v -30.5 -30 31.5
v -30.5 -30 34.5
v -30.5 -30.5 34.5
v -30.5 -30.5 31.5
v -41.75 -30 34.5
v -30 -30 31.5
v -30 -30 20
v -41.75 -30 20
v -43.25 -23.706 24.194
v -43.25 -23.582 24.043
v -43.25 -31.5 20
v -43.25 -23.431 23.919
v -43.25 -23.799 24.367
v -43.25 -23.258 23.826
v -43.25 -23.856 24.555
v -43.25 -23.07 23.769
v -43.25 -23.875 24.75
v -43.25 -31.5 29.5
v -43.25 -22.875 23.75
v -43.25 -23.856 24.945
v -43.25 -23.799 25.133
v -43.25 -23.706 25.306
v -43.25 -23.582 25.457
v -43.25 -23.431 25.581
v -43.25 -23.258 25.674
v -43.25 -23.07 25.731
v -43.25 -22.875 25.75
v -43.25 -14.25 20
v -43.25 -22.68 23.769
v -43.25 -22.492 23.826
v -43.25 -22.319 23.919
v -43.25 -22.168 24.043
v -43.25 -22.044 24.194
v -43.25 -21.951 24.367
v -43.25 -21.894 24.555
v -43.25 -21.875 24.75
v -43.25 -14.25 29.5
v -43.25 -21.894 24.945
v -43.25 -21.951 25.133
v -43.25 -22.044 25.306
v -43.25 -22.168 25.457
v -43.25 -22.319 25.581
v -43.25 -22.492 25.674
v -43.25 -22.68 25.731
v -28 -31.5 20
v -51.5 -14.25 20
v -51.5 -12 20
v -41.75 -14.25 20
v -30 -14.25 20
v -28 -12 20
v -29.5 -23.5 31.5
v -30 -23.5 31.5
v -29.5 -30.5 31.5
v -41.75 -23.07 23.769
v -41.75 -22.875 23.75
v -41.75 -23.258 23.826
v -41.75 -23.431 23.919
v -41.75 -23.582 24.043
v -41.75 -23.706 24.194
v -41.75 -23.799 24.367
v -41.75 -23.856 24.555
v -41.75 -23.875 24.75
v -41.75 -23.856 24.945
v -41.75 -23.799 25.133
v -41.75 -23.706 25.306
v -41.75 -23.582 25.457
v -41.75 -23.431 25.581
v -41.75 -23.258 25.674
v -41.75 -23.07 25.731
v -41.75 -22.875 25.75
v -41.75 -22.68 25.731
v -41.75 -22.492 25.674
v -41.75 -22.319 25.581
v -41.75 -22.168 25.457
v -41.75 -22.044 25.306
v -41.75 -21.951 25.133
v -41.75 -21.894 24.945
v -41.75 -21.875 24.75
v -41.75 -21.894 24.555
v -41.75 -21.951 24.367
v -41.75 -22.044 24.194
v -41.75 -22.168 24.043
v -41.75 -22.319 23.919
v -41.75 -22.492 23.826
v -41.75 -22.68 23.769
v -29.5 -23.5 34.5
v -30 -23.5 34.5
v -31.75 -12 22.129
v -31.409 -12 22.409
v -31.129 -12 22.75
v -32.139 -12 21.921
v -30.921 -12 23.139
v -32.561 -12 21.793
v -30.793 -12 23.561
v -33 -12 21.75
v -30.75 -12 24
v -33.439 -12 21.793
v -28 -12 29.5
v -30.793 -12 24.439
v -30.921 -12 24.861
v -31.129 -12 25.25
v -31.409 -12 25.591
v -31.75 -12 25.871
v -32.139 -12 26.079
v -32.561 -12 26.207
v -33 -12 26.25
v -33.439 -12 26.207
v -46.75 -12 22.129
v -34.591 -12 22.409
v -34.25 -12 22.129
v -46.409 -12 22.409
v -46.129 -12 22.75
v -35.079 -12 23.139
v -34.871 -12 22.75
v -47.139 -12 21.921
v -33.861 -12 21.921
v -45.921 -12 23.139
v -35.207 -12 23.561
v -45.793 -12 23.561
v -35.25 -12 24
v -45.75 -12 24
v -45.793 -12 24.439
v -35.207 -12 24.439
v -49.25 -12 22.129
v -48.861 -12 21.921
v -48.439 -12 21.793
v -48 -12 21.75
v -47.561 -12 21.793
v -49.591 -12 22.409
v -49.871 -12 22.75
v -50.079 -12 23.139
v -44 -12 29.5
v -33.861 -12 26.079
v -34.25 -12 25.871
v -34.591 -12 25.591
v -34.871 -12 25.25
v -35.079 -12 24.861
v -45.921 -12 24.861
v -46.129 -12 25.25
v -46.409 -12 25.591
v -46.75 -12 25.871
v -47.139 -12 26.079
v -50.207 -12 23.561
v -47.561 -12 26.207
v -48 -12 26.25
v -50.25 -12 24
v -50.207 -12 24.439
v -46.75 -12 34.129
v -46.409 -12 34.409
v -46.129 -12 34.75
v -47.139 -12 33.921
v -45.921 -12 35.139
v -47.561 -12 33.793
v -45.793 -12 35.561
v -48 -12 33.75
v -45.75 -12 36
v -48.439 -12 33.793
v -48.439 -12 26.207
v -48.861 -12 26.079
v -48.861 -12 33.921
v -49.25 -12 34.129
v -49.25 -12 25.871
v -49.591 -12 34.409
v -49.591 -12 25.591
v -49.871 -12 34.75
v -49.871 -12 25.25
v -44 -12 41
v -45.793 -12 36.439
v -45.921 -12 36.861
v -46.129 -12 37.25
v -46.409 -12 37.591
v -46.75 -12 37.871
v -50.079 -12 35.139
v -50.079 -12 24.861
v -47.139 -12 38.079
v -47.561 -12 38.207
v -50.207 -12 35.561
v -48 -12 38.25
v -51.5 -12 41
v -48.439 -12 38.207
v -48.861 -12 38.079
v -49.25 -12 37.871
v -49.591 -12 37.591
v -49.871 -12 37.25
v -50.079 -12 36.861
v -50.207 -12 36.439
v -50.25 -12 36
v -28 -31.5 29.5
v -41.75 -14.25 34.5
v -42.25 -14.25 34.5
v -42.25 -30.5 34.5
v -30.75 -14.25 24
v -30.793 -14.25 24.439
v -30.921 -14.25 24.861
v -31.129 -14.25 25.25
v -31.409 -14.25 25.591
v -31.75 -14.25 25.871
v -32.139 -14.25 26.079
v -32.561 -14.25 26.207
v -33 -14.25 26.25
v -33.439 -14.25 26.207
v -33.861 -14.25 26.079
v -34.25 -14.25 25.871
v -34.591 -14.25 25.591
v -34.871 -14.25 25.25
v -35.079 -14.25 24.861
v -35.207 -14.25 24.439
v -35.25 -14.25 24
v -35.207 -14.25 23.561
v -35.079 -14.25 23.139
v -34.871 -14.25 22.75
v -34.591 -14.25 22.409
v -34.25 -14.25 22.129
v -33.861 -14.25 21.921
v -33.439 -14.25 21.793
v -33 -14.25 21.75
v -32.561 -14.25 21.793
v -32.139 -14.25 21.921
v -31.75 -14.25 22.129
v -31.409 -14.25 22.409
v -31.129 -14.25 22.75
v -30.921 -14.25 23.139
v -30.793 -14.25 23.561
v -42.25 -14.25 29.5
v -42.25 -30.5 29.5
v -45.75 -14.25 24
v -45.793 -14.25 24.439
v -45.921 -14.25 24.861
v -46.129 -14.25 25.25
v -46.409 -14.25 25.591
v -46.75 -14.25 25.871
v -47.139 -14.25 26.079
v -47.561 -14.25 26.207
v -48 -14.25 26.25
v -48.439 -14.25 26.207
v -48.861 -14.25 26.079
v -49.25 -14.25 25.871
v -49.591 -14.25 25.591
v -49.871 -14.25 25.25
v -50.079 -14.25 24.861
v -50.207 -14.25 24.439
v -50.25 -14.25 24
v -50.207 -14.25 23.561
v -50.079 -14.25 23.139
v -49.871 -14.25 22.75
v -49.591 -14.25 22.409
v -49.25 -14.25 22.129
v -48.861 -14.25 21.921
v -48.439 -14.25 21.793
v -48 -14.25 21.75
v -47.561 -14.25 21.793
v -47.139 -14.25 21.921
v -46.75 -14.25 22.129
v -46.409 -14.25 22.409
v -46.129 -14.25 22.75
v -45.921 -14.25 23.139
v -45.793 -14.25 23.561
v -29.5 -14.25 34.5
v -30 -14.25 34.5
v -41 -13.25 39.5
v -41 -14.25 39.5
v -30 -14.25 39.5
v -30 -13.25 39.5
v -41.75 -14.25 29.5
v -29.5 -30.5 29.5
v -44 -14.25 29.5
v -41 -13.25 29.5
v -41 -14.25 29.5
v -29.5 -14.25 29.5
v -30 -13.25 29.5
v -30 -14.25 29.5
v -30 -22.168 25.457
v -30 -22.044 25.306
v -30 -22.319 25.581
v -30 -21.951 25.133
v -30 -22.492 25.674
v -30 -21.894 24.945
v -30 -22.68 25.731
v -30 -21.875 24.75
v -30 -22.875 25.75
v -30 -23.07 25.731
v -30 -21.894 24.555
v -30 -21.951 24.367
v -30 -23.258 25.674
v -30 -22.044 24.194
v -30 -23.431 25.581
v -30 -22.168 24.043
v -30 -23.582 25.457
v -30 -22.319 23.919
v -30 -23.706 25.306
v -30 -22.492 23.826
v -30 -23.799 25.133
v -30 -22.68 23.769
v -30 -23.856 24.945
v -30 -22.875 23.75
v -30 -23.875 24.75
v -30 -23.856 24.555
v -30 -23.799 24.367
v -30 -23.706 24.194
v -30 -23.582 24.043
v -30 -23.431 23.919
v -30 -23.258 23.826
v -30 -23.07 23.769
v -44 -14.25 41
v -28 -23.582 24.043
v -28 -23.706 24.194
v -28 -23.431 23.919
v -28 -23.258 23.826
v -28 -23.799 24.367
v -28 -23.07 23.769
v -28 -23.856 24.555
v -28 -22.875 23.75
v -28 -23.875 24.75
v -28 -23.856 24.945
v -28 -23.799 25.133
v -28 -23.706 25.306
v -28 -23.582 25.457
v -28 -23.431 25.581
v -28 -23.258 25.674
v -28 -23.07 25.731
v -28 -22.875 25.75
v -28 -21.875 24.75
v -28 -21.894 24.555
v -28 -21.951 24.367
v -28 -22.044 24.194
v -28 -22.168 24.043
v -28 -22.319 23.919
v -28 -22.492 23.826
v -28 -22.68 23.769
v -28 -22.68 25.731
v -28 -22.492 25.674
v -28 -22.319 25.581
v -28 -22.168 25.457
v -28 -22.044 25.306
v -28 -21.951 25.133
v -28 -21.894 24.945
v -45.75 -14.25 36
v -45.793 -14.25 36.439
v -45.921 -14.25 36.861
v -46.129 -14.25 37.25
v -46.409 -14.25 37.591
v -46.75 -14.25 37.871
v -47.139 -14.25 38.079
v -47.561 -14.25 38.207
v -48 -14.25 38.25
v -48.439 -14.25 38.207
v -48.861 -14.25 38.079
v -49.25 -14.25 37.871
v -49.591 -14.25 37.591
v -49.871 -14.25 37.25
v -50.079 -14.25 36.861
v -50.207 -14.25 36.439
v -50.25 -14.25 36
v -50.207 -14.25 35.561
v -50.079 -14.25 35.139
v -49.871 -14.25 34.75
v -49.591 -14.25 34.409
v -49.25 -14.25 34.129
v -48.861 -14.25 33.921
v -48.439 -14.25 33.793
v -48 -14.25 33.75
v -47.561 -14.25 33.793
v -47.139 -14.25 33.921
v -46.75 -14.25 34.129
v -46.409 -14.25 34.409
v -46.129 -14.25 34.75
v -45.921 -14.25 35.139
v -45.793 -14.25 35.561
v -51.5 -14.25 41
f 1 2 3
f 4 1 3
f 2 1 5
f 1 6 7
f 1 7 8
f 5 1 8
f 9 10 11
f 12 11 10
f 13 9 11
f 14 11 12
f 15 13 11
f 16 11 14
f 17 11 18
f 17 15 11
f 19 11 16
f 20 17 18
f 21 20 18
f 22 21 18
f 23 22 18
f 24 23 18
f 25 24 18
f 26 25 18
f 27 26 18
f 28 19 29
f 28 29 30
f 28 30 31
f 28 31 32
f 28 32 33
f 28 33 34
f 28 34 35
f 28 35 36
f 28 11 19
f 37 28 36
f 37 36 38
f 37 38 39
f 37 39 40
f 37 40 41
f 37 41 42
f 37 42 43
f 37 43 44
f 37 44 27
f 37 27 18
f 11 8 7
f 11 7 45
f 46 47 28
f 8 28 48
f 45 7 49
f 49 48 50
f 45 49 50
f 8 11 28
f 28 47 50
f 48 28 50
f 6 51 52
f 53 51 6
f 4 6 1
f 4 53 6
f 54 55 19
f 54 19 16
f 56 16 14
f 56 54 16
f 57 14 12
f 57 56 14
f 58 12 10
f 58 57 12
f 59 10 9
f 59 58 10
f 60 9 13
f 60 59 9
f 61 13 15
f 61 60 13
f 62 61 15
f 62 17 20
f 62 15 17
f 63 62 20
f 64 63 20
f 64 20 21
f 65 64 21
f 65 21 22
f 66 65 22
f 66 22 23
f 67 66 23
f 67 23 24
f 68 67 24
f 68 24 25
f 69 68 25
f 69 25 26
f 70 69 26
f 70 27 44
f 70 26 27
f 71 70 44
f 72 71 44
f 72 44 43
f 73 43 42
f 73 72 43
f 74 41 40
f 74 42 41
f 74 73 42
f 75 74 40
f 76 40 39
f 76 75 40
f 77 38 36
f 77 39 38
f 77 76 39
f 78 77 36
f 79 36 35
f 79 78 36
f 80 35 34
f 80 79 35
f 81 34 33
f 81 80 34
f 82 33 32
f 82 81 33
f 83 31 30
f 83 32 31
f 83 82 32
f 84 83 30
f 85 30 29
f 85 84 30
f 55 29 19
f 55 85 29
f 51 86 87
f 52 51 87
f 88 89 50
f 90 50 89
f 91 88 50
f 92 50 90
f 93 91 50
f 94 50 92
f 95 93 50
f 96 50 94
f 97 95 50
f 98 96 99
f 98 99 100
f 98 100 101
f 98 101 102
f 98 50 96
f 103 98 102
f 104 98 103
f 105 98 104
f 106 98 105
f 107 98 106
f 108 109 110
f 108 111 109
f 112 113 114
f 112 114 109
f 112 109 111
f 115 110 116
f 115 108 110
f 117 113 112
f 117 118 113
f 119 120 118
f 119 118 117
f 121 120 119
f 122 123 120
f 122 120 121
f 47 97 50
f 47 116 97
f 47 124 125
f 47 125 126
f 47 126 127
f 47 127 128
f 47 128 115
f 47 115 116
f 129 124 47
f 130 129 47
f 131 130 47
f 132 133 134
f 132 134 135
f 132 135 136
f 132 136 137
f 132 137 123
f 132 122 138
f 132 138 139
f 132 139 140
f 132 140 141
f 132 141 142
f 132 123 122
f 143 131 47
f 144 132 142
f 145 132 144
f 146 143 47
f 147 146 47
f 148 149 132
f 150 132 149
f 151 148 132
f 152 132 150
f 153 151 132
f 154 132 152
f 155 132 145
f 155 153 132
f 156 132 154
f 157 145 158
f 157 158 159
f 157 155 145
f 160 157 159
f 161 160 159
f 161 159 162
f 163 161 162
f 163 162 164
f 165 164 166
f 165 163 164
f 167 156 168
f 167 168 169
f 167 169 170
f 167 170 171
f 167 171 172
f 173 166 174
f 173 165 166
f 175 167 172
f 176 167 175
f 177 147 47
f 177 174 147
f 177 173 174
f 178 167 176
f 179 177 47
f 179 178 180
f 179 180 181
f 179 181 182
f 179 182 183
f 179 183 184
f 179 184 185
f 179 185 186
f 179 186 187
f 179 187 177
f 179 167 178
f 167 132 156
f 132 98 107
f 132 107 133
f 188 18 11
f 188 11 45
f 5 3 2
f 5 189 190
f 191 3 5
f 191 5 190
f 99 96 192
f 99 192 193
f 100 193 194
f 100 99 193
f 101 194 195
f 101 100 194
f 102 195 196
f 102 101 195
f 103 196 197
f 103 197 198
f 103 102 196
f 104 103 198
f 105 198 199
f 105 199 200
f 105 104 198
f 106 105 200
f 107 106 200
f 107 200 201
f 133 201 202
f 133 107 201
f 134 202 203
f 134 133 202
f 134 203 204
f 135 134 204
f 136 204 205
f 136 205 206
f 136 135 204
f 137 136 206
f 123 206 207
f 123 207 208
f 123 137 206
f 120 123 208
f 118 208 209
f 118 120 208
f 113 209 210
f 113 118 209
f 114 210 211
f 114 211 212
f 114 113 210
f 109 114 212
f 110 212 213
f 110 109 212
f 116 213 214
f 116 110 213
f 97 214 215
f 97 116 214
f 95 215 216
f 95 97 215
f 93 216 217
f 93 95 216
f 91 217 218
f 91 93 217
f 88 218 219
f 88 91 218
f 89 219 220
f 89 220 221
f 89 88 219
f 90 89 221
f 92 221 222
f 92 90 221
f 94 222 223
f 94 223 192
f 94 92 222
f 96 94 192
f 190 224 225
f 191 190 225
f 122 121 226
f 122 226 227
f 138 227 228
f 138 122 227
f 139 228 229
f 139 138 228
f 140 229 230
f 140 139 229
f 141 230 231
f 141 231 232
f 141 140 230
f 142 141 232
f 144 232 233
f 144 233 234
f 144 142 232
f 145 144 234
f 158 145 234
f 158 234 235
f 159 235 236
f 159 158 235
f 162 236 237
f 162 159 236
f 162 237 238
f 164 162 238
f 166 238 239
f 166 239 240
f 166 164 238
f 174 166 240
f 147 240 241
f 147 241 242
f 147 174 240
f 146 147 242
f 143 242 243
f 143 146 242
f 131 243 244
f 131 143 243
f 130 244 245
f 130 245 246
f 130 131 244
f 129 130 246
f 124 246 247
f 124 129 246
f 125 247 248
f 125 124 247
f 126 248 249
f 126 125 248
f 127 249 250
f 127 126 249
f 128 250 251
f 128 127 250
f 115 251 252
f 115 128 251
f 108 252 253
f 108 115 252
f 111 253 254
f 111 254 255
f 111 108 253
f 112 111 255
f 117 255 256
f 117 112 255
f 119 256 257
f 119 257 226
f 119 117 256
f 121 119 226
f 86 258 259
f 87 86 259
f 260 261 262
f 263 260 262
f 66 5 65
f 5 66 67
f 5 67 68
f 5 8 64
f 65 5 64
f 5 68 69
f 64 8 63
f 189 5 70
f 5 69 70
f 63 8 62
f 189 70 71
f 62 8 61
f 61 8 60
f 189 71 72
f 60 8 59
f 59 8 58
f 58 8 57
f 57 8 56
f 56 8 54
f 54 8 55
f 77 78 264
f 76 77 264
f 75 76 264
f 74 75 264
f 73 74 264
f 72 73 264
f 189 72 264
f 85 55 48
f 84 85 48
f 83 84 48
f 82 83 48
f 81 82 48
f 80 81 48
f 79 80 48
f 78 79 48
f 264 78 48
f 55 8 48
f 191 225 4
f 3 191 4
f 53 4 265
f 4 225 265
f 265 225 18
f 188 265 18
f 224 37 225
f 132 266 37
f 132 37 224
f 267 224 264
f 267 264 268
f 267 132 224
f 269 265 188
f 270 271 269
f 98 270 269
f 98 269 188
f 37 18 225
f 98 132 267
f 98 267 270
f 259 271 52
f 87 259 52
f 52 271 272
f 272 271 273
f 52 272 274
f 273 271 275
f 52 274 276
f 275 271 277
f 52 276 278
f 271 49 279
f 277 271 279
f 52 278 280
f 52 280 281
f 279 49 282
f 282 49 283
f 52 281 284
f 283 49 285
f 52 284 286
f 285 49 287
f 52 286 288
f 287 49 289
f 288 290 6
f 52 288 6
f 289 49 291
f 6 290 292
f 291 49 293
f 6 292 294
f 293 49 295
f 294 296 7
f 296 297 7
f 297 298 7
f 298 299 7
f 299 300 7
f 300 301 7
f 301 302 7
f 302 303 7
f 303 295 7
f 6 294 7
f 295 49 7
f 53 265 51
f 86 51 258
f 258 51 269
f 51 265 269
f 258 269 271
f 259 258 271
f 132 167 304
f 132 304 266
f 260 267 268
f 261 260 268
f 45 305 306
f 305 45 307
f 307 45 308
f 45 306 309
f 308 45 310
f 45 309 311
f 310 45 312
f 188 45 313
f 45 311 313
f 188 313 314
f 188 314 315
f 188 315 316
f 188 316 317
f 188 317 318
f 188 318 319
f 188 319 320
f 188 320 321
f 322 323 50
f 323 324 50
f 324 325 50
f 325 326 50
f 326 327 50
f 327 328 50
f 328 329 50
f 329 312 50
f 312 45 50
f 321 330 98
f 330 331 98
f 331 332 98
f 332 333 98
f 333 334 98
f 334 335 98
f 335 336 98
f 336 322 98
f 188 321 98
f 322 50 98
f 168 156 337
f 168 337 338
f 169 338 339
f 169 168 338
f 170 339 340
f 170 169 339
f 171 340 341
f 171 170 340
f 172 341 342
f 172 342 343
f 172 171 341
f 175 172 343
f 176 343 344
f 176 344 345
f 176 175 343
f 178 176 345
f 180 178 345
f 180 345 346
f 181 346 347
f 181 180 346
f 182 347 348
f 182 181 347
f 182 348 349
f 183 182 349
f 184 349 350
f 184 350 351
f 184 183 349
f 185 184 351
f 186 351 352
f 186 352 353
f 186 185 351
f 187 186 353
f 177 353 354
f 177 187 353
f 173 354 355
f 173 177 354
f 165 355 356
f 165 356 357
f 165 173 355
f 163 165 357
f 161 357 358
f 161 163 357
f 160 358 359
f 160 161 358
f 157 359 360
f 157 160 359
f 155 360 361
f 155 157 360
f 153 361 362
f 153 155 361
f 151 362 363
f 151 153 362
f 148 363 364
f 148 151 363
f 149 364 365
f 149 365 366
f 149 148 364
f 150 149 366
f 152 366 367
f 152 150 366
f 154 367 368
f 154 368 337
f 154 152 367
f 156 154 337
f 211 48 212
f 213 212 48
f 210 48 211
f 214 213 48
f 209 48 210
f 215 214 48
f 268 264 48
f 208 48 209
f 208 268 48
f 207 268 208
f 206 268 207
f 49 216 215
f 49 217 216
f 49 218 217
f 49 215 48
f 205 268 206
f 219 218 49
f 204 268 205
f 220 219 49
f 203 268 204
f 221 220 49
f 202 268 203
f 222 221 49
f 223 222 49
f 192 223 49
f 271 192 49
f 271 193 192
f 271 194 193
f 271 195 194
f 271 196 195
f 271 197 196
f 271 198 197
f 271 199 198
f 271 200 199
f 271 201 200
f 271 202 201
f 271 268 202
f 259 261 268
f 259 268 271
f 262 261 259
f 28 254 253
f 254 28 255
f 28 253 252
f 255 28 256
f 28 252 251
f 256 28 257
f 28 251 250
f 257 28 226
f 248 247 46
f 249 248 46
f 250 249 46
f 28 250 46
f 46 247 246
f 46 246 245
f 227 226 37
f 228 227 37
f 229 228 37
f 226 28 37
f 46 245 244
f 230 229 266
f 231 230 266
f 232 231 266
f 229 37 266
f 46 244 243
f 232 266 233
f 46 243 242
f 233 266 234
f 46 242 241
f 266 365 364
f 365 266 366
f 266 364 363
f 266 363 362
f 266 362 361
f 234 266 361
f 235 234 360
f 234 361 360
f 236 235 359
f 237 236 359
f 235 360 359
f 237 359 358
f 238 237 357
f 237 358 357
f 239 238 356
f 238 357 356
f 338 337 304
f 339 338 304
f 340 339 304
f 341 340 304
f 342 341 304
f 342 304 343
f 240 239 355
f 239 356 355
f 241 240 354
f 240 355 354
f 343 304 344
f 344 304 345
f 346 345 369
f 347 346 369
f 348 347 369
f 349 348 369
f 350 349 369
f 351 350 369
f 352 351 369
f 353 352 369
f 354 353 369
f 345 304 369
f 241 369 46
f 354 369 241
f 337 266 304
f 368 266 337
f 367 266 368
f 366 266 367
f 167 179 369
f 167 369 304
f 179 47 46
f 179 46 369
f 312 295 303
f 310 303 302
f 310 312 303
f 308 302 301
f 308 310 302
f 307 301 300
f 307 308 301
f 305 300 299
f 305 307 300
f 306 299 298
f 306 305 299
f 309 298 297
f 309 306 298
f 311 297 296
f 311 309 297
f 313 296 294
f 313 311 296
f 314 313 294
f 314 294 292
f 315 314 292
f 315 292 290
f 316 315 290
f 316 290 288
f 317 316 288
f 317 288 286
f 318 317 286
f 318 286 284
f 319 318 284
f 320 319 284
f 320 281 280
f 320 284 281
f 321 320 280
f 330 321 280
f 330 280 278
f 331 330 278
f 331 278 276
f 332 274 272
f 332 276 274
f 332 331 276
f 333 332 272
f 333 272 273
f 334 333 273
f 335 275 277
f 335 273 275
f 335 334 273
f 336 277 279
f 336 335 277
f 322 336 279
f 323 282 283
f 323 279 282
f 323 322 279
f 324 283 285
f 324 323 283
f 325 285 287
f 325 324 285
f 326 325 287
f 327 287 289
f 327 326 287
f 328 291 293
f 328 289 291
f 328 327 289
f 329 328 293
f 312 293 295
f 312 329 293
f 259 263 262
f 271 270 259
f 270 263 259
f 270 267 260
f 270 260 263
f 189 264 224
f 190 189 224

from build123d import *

# Parameters (mm, degrees)
SKETCH036_R             = 2.25
PAD016_DEPTH            = 2.25
SKETCH037_W             = 11
SKETCH037_H             = 1
PAD017_DEPTH            = 10
SKETCH038_W             = 15.25
SKETCH038_H             = 9.5
PAD018_DEPTH            = 17.25
SKETCH039_W             = 11.75
SKETCH039_H             = 15.75
POCKET007008_DEPTH      = 9.501
SKETCH040_R             = 1
POCKET007009_DEPTH      = 23.501
PAD019_DEPTH            = 5
SKETCH043_W             = 1
SKETCH043_H             = 7
POCKET007011_DEPTH      = 3
BODY008_PLACEMENT_ANGLE = 90


with BuildPart() as part:
    # Sketch036 → Pad016 (new body)
    with BuildSketch(Plane.XY):
        Polygon((-75.5, -11), (-68, -11), (-68, -22.5), (-52, -22.5), (-52, -32), (-75.5, -32), align=None)
        with Locations((-72, -16)):
            Circle(SKETCH036_R, mode=Mode.SUBTRACT)
        with Locations((-72, -28)):
            Circle(SKETCH036_R, mode=Mode.SUBTRACT)
        with Locations((-57, -28)):
            Circle(SKETCH036_R, mode=Mode.SUBTRACT)
    extrude(amount=PAD016_DEPTH)

    # Sketch037 (on DatumPlane) → Pad017 (join)
    with BuildSketch(Plane(origin=(-68, -22.5, 0), x_dir=(1, 0, 0), z_dir=(0, -1, 0))):
        with Locations((8.5, 1.75)):
            Rectangle(SKETCH037_W, SKETCH037_H)
    extrude(amount=-PAD017_DEPTH)

    # Sketch038 (on DatumPlane) → Pad018 (join)
    with BuildSketch(Plane.XY.offset(2.25)):
        with Locations((-59.625, -27.25)):
            Rectangle(SKETCH038_W, SKETCH038_H)
    extrude(amount=PAD018_DEPTH)

    # Sketch039 (on DatumPlane) → Pocket007008 (cut, through all)
    with BuildSketch(Plane(origin=(-68, -22.5, 0), x_dir=(1, 0, 0), z_dir=(0, -1, 0))):
        with Locations((8.125, 10.125)):
            Rectangle(SKETCH039_W, SKETCH039_H)
    extrude(amount=POCKET007008_DEPTH, mode=Mode.SUBTRACT)

    # Sketch040 (on DatumPlane) → Pocket007009 (cut, through all)
    with BuildSketch(Plane(origin=(-52, -27.25, 2.25), x_dir=(0, -1, 0), z_dir=(-1, 0, 0))):
        with Locations((0, 8.625)):
            Circle(SKETCH040_R)
    extrude(amount=POCKET007009_DEPTH, mode=Mode.SUBTRACT)

    # Sketch042 (on DatumPlane) → Pad019 (join)
    with BuildSketch(Plane(origin=(-68, -22.5, 0), x_dir=(1, 0, 0), z_dir=(0, -1, 0))):
        Polygon((14.5, 18.5), (14.5, 2.25), (14, 2.25), (14, 18), (2.25, 18), (2.25, 2.25), (1.75, 2.25), (1.75, 18.5), align=None)
    extrude(amount=-PAD019_DEPTH)

    # Sketch043 (on DatumPlane) → Pocket007011 (cut)
    with BuildSketch(Plane(origin=(-68, -17.5, 0), x_dir=(-1, 0, 0), z_dir=(0, 1, 0))):
        with Locations((-14, 15)):
            Rectangle(SKETCH043_W, SKETCH043_H)
    extrude(amount=-POCKET007011_DEPTH, mode=Mode.SUBTRACT)


with BuildPart() as part_1:
    # Body002 placement: moved
    add(part.part.moved(Location((0, 0, 22))))


with BuildPart() as part_2:
    # Body008 placement: moved
    add(part_1.part.moved(Location((24, 10, 52))).rotate(Axis((24, 10, 52), (1, 0, 0)), BODY008_PLACEMENT_ANGLE))


solid = part_2.part
